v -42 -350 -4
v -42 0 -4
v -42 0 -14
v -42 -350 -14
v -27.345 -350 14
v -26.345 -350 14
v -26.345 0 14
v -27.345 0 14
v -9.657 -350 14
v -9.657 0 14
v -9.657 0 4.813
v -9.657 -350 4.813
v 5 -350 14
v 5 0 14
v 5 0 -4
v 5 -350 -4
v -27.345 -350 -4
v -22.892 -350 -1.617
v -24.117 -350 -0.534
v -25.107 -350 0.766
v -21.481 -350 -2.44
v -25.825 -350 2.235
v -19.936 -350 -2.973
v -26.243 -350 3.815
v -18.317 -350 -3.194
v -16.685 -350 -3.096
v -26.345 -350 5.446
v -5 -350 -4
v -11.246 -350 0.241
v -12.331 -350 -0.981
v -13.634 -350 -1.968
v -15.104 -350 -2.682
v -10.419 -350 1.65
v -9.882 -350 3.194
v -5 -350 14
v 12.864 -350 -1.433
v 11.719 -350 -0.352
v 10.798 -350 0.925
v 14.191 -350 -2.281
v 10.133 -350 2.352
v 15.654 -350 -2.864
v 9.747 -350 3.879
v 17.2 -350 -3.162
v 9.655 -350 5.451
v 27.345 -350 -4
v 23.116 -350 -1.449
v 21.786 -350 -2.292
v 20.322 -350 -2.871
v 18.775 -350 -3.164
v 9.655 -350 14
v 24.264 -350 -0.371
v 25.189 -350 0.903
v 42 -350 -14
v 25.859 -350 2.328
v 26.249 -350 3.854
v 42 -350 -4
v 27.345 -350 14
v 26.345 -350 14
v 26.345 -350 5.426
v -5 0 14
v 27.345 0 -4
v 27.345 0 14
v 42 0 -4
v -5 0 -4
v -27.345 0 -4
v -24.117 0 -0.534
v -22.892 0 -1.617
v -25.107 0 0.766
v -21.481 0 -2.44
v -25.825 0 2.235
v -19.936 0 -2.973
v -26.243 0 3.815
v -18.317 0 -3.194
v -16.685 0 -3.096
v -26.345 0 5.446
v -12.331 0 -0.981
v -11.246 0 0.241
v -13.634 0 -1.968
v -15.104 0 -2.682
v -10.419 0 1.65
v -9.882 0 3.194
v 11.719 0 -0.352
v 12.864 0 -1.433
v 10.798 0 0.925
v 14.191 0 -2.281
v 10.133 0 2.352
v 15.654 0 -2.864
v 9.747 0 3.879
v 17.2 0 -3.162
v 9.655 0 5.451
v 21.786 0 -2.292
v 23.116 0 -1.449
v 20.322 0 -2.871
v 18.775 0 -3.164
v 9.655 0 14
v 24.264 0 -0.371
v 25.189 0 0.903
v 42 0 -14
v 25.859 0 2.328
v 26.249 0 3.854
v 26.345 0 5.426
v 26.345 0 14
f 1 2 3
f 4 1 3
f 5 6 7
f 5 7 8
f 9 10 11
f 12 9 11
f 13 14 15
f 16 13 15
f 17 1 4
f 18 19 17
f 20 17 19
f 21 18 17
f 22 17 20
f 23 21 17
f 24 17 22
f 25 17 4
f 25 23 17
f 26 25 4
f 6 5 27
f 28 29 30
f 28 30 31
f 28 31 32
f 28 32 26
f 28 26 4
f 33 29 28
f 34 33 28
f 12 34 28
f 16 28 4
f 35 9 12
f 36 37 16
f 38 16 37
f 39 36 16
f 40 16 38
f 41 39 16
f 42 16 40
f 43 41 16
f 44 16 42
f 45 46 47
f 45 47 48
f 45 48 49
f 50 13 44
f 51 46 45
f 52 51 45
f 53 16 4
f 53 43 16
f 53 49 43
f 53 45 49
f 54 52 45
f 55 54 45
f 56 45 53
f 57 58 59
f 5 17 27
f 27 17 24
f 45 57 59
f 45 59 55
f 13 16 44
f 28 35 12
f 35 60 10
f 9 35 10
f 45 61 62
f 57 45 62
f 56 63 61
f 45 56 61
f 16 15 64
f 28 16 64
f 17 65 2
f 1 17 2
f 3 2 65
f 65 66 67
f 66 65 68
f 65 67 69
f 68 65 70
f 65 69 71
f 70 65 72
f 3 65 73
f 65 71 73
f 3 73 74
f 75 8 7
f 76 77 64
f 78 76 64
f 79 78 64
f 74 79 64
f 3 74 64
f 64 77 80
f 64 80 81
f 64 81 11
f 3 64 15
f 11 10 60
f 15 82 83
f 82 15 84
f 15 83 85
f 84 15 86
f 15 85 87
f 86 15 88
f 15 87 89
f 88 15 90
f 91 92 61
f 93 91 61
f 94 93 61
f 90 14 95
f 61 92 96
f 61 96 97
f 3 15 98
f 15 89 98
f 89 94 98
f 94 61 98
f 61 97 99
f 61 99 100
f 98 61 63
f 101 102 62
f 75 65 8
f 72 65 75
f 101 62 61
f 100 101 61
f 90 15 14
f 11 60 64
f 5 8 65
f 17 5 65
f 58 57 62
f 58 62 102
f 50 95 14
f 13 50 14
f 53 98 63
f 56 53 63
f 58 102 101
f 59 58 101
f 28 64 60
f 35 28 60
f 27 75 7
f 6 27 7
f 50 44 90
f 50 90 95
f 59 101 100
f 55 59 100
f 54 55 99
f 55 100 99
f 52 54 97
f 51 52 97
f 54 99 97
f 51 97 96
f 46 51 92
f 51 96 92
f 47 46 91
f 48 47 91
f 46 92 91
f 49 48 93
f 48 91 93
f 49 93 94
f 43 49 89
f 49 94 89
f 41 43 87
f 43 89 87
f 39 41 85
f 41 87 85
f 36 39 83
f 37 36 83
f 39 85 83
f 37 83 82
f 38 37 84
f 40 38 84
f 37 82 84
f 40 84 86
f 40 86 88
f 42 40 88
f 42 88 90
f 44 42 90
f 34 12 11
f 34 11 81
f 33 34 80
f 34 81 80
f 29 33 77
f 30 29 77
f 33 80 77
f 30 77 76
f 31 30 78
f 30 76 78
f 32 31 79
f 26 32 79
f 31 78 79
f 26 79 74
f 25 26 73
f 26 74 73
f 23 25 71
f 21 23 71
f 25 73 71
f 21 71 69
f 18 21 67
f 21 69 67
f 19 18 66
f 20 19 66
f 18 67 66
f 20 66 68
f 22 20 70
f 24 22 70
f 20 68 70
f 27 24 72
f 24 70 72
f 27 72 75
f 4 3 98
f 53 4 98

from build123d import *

# Parameters (mm, degrees)
F1_DEPTH = 350


with BuildPart() as f1:
    # F0 (on Front) → F1 (new body)
    with BuildSketch(Plane.XZ):
        with BuildLine():
            Line((-9.656821, 5.487433), (-9.656821, 4.812567))
            ThreePointArc((-9.656821, 4.812567), (-9.65, 5.15), (-9.656821, 5.487433))
        make_face()
        with BuildLine():
            Line((-42, -14), (42, -14))
            Line((42, -14), (42, -4))
            Line((42, -4), (27.345447, -4))
            Line((27.345447, -4), (27.345447, 14))
            Line((27.345447, 14), (26.345447, 14))
            Line((26.345447, 14), (26.345447, 5.425711))
            ThreePointArc((26.345447, 5.425711), (17.987329, -3.19999), (9.655428, 5.451038))
            Line((9.655428, 5.451038), (9.655428, 14))
            Line((9.655428, 14), (5, 14))
            Line((5, 14), (5, -4))
            Line((5, -4), (-5, -4))
            Line((-5, -4), (-5, 14))
            Line((-5, 14), (-9.656821, 14))
            Line((-9.656821, 14), (-9.656821, 5.487433))
            ThreePointArc((-9.656821, 5.487433), (-9.65, 5.15), (-9.656821, 4.812567))
            ThreePointArc((-9.656821, 4.812567), (-18.316515, -3.193999), (-26.344766, 5.445596))
            Line((-26.344766, 5.445596), (-26.344766, 14))
            Line((-26.344766, 14), (-27.344766, 14))
            Line((-27.344766, 14), (-27.344766, -4))
            Line((-27.344766, -4), (-42, -4))
            Line((-42, -4), (-42, -14))
        make_face()
    extrude(amount=F1_DEPTH)


solid = f1.part
